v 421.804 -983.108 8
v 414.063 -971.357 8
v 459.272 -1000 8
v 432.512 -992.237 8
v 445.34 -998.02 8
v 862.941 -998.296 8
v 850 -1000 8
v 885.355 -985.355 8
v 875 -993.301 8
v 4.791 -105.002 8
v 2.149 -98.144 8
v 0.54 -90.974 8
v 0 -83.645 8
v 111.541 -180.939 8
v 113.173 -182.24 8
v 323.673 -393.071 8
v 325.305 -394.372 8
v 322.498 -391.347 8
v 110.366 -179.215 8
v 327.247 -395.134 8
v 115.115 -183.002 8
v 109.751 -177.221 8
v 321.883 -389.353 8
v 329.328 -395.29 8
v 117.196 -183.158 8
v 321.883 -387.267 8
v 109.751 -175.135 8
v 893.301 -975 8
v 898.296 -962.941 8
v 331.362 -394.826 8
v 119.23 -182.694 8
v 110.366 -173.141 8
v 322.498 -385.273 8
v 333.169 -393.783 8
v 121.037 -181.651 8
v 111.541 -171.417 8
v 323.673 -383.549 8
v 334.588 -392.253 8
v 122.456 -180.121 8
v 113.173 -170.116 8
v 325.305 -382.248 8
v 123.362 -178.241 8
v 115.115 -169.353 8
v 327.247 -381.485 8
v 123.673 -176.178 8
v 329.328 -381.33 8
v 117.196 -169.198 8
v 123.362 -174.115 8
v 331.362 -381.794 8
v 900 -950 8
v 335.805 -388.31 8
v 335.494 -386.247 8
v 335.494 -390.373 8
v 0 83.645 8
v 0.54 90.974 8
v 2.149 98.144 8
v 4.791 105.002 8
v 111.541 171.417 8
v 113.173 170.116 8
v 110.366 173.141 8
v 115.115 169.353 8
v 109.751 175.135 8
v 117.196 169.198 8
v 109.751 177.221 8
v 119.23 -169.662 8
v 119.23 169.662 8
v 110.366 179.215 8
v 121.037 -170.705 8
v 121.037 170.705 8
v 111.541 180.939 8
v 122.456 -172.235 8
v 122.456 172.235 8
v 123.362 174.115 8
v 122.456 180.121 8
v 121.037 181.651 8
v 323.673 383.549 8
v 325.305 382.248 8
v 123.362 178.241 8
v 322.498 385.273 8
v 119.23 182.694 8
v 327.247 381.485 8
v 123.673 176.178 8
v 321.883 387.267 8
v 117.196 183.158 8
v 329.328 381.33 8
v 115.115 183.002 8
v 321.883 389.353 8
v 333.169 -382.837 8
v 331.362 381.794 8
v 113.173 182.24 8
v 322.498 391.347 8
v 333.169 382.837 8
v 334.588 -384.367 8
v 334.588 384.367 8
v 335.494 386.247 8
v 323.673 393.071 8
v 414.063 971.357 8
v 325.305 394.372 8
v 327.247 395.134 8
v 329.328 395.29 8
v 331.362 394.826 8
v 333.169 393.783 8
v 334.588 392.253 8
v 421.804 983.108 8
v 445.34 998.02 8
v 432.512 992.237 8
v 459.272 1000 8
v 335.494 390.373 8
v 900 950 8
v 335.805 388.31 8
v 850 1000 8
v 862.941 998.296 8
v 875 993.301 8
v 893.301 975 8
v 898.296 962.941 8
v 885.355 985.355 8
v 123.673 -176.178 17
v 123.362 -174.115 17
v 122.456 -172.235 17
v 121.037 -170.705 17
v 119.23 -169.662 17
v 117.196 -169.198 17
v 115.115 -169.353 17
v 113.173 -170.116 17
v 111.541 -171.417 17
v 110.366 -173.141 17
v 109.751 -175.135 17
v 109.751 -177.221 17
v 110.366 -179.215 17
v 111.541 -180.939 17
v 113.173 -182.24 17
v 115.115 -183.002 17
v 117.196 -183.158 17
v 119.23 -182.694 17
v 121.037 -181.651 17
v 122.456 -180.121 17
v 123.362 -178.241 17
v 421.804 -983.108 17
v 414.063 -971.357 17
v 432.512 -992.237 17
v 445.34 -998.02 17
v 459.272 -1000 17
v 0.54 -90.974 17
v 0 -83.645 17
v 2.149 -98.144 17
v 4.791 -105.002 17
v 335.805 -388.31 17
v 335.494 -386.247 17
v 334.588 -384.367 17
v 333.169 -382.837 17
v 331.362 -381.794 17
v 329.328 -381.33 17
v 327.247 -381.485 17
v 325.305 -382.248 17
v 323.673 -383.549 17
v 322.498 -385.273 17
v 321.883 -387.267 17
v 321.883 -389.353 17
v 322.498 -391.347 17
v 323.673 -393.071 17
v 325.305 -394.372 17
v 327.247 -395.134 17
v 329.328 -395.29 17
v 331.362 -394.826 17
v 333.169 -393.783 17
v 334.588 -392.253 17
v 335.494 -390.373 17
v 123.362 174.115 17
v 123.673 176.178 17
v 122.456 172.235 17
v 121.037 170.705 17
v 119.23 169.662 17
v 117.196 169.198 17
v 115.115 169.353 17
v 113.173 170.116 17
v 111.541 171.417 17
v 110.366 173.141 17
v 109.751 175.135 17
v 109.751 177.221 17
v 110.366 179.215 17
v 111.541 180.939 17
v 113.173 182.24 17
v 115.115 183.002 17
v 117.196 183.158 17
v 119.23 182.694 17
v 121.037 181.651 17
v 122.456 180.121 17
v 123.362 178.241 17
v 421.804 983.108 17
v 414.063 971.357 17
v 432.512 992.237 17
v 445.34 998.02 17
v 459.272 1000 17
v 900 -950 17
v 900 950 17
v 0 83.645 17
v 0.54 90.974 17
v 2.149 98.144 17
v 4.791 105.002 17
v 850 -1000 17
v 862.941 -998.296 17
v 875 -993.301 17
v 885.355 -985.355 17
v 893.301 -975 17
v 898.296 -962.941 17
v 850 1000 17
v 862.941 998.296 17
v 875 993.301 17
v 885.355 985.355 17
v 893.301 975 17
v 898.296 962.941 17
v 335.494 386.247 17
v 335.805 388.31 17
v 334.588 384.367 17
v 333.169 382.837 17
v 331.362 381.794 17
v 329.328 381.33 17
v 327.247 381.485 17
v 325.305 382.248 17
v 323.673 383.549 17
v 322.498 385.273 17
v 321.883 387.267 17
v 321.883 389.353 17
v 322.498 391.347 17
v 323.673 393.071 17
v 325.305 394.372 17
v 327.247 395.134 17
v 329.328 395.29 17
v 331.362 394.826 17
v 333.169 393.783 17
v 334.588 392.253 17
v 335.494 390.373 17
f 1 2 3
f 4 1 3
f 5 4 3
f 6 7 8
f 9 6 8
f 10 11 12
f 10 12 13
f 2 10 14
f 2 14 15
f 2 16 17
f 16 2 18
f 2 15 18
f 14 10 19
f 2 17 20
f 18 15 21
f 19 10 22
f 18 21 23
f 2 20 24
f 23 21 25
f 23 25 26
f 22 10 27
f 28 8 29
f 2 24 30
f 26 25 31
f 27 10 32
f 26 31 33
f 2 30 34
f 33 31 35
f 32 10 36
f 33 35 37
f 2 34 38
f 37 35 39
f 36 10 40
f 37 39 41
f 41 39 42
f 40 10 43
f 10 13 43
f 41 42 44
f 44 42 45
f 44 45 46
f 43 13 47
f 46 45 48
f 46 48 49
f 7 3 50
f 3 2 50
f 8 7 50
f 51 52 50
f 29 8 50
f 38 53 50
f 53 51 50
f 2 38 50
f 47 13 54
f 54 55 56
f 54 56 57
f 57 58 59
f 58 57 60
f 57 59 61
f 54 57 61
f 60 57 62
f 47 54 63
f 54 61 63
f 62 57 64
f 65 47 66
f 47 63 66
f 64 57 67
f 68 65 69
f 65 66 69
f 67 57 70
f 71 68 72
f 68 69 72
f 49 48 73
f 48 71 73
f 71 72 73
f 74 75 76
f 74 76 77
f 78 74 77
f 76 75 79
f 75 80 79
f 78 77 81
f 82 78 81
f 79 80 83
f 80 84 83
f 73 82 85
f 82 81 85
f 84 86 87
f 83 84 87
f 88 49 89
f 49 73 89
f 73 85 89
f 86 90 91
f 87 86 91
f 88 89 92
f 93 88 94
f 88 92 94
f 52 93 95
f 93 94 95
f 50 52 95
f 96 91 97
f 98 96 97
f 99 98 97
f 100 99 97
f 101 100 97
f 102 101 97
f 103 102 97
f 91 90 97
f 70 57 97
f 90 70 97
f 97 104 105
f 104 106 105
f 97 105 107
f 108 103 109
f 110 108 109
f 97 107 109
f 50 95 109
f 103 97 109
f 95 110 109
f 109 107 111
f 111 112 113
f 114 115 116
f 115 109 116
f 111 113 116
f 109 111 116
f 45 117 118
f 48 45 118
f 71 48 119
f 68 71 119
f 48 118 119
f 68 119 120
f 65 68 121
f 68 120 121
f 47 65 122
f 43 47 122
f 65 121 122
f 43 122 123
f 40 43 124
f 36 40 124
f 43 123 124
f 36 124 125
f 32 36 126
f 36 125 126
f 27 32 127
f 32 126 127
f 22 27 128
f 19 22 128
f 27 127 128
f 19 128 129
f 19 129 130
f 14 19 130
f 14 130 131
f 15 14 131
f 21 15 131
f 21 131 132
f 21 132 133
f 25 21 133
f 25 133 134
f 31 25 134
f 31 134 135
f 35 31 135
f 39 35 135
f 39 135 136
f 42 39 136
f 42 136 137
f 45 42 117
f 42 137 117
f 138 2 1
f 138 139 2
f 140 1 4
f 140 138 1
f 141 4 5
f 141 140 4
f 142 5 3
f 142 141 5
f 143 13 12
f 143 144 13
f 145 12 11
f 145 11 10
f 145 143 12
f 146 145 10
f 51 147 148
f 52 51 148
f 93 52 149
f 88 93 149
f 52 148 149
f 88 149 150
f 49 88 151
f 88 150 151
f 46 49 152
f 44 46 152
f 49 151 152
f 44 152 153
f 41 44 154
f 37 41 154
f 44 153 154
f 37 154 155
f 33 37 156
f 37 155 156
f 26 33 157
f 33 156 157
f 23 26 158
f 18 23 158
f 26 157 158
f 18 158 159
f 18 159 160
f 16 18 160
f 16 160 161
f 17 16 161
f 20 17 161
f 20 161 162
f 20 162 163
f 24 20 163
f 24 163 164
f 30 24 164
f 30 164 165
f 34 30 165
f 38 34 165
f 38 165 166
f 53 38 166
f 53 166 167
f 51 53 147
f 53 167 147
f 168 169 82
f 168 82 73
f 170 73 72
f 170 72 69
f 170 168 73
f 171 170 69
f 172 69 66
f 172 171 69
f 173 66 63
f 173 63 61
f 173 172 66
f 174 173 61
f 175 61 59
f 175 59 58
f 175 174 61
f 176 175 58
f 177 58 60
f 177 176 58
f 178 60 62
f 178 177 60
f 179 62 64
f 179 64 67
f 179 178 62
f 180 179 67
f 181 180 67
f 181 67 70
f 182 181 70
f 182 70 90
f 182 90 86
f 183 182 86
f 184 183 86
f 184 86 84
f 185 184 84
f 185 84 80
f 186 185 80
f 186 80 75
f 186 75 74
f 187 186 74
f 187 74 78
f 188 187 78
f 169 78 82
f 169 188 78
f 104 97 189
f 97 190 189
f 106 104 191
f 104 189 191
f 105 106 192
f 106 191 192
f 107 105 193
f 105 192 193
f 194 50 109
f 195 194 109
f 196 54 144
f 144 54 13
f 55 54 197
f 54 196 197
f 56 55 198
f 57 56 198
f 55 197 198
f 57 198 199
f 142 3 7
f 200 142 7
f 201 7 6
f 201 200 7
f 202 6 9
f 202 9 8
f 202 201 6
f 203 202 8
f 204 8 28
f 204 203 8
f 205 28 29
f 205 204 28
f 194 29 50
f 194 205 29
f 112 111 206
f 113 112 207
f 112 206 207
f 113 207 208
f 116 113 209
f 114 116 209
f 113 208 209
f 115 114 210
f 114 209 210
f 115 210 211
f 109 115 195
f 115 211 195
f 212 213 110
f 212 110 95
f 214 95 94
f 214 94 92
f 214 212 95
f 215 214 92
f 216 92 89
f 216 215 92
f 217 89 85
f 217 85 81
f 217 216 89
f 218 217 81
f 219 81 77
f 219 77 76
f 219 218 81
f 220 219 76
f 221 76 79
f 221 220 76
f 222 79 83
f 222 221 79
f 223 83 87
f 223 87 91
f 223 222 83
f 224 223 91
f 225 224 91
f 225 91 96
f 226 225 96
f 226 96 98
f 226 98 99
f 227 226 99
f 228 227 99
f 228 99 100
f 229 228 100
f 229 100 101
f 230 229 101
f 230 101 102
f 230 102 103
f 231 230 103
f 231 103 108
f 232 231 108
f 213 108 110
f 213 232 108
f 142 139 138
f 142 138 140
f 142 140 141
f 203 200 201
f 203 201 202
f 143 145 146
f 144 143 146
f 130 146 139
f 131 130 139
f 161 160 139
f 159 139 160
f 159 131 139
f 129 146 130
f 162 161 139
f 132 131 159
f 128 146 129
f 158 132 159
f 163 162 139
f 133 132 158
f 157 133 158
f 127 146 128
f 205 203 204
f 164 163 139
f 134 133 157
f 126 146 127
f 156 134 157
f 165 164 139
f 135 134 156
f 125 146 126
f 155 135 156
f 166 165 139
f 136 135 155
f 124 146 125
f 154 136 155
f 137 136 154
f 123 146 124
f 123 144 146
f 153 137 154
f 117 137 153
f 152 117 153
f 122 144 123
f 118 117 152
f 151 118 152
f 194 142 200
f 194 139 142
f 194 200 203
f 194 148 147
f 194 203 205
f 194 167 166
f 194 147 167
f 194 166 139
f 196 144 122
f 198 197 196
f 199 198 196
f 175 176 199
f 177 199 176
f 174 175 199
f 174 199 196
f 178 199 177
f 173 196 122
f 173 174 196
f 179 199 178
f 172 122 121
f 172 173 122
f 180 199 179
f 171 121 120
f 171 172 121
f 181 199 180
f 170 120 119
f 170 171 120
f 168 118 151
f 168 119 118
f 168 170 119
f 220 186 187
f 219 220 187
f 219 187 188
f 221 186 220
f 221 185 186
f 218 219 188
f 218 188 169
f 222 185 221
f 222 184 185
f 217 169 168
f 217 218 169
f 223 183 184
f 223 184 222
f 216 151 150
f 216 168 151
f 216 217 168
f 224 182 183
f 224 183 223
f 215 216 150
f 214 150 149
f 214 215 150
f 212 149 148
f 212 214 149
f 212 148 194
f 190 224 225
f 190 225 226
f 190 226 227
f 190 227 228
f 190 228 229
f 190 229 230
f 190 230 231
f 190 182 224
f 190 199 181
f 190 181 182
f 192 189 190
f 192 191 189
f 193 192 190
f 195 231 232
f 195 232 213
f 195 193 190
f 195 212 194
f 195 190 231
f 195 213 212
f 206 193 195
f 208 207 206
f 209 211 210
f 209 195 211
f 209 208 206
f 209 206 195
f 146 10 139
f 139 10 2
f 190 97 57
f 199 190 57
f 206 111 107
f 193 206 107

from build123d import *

# Parameters (mm, degrees)
PAD_DEPTH    = 9
SKETCH001_R  = 7
POCKET_DEPTH = 9
FILLET_R     = 50


with BuildPart() as part:
    # Sketch → Pad (new body)
    with BuildSketch(Plane.XY):
        Polygon((0, 94.860678), (0, 0), (0, -94.860678), (427.593604, -1000), (900, -1000), (900, 1000), (427.593604, 1000), align=None)
    extrude(amount=PAD_DEPTH)

    # Sketch001 (on DatumPlane) → Pocket (cut)
    with BuildSketch(Plane.XY.offset(9)):
        with Locations((328.804653, -388.309992)):
            Circle(SKETCH001_R)
        with Locations((116.672619, -176.177958)):
            Circle(SKETCH001_R)
    pocket = extrude(amount=-POCKET_DEPTH, mode=Mode.SUBTRACT)

    # Mirrored: Pocket across Sketch001 H_Axis
    add(pocket.mirror(Plane(origin=(0, 0, 9), x_dir=(0, 0, 1), z_dir=(0, 1, 0))), mode=Mode.SUBTRACT)

    # Fillet
    fillet_edges = [part.edges().sort_by_distance(p)[0] for p in [
        (0, 94.860678, 4.5),
        (0, -94.860678, 4.5),
        (427.593604, -1000, 4.5),
        (900, -1000, 4.5),
        (900, 1000, 4.5),
        (427.593604, 1000, 4.5),
    ]]
    fillet(fillet_edges, radius=FILLET_R)


with BuildPart() as part_1:
    # Fillet001Body placement: moved
    add(part.part.moved(Location((0, 0, 8))))


solid = part_1.part
